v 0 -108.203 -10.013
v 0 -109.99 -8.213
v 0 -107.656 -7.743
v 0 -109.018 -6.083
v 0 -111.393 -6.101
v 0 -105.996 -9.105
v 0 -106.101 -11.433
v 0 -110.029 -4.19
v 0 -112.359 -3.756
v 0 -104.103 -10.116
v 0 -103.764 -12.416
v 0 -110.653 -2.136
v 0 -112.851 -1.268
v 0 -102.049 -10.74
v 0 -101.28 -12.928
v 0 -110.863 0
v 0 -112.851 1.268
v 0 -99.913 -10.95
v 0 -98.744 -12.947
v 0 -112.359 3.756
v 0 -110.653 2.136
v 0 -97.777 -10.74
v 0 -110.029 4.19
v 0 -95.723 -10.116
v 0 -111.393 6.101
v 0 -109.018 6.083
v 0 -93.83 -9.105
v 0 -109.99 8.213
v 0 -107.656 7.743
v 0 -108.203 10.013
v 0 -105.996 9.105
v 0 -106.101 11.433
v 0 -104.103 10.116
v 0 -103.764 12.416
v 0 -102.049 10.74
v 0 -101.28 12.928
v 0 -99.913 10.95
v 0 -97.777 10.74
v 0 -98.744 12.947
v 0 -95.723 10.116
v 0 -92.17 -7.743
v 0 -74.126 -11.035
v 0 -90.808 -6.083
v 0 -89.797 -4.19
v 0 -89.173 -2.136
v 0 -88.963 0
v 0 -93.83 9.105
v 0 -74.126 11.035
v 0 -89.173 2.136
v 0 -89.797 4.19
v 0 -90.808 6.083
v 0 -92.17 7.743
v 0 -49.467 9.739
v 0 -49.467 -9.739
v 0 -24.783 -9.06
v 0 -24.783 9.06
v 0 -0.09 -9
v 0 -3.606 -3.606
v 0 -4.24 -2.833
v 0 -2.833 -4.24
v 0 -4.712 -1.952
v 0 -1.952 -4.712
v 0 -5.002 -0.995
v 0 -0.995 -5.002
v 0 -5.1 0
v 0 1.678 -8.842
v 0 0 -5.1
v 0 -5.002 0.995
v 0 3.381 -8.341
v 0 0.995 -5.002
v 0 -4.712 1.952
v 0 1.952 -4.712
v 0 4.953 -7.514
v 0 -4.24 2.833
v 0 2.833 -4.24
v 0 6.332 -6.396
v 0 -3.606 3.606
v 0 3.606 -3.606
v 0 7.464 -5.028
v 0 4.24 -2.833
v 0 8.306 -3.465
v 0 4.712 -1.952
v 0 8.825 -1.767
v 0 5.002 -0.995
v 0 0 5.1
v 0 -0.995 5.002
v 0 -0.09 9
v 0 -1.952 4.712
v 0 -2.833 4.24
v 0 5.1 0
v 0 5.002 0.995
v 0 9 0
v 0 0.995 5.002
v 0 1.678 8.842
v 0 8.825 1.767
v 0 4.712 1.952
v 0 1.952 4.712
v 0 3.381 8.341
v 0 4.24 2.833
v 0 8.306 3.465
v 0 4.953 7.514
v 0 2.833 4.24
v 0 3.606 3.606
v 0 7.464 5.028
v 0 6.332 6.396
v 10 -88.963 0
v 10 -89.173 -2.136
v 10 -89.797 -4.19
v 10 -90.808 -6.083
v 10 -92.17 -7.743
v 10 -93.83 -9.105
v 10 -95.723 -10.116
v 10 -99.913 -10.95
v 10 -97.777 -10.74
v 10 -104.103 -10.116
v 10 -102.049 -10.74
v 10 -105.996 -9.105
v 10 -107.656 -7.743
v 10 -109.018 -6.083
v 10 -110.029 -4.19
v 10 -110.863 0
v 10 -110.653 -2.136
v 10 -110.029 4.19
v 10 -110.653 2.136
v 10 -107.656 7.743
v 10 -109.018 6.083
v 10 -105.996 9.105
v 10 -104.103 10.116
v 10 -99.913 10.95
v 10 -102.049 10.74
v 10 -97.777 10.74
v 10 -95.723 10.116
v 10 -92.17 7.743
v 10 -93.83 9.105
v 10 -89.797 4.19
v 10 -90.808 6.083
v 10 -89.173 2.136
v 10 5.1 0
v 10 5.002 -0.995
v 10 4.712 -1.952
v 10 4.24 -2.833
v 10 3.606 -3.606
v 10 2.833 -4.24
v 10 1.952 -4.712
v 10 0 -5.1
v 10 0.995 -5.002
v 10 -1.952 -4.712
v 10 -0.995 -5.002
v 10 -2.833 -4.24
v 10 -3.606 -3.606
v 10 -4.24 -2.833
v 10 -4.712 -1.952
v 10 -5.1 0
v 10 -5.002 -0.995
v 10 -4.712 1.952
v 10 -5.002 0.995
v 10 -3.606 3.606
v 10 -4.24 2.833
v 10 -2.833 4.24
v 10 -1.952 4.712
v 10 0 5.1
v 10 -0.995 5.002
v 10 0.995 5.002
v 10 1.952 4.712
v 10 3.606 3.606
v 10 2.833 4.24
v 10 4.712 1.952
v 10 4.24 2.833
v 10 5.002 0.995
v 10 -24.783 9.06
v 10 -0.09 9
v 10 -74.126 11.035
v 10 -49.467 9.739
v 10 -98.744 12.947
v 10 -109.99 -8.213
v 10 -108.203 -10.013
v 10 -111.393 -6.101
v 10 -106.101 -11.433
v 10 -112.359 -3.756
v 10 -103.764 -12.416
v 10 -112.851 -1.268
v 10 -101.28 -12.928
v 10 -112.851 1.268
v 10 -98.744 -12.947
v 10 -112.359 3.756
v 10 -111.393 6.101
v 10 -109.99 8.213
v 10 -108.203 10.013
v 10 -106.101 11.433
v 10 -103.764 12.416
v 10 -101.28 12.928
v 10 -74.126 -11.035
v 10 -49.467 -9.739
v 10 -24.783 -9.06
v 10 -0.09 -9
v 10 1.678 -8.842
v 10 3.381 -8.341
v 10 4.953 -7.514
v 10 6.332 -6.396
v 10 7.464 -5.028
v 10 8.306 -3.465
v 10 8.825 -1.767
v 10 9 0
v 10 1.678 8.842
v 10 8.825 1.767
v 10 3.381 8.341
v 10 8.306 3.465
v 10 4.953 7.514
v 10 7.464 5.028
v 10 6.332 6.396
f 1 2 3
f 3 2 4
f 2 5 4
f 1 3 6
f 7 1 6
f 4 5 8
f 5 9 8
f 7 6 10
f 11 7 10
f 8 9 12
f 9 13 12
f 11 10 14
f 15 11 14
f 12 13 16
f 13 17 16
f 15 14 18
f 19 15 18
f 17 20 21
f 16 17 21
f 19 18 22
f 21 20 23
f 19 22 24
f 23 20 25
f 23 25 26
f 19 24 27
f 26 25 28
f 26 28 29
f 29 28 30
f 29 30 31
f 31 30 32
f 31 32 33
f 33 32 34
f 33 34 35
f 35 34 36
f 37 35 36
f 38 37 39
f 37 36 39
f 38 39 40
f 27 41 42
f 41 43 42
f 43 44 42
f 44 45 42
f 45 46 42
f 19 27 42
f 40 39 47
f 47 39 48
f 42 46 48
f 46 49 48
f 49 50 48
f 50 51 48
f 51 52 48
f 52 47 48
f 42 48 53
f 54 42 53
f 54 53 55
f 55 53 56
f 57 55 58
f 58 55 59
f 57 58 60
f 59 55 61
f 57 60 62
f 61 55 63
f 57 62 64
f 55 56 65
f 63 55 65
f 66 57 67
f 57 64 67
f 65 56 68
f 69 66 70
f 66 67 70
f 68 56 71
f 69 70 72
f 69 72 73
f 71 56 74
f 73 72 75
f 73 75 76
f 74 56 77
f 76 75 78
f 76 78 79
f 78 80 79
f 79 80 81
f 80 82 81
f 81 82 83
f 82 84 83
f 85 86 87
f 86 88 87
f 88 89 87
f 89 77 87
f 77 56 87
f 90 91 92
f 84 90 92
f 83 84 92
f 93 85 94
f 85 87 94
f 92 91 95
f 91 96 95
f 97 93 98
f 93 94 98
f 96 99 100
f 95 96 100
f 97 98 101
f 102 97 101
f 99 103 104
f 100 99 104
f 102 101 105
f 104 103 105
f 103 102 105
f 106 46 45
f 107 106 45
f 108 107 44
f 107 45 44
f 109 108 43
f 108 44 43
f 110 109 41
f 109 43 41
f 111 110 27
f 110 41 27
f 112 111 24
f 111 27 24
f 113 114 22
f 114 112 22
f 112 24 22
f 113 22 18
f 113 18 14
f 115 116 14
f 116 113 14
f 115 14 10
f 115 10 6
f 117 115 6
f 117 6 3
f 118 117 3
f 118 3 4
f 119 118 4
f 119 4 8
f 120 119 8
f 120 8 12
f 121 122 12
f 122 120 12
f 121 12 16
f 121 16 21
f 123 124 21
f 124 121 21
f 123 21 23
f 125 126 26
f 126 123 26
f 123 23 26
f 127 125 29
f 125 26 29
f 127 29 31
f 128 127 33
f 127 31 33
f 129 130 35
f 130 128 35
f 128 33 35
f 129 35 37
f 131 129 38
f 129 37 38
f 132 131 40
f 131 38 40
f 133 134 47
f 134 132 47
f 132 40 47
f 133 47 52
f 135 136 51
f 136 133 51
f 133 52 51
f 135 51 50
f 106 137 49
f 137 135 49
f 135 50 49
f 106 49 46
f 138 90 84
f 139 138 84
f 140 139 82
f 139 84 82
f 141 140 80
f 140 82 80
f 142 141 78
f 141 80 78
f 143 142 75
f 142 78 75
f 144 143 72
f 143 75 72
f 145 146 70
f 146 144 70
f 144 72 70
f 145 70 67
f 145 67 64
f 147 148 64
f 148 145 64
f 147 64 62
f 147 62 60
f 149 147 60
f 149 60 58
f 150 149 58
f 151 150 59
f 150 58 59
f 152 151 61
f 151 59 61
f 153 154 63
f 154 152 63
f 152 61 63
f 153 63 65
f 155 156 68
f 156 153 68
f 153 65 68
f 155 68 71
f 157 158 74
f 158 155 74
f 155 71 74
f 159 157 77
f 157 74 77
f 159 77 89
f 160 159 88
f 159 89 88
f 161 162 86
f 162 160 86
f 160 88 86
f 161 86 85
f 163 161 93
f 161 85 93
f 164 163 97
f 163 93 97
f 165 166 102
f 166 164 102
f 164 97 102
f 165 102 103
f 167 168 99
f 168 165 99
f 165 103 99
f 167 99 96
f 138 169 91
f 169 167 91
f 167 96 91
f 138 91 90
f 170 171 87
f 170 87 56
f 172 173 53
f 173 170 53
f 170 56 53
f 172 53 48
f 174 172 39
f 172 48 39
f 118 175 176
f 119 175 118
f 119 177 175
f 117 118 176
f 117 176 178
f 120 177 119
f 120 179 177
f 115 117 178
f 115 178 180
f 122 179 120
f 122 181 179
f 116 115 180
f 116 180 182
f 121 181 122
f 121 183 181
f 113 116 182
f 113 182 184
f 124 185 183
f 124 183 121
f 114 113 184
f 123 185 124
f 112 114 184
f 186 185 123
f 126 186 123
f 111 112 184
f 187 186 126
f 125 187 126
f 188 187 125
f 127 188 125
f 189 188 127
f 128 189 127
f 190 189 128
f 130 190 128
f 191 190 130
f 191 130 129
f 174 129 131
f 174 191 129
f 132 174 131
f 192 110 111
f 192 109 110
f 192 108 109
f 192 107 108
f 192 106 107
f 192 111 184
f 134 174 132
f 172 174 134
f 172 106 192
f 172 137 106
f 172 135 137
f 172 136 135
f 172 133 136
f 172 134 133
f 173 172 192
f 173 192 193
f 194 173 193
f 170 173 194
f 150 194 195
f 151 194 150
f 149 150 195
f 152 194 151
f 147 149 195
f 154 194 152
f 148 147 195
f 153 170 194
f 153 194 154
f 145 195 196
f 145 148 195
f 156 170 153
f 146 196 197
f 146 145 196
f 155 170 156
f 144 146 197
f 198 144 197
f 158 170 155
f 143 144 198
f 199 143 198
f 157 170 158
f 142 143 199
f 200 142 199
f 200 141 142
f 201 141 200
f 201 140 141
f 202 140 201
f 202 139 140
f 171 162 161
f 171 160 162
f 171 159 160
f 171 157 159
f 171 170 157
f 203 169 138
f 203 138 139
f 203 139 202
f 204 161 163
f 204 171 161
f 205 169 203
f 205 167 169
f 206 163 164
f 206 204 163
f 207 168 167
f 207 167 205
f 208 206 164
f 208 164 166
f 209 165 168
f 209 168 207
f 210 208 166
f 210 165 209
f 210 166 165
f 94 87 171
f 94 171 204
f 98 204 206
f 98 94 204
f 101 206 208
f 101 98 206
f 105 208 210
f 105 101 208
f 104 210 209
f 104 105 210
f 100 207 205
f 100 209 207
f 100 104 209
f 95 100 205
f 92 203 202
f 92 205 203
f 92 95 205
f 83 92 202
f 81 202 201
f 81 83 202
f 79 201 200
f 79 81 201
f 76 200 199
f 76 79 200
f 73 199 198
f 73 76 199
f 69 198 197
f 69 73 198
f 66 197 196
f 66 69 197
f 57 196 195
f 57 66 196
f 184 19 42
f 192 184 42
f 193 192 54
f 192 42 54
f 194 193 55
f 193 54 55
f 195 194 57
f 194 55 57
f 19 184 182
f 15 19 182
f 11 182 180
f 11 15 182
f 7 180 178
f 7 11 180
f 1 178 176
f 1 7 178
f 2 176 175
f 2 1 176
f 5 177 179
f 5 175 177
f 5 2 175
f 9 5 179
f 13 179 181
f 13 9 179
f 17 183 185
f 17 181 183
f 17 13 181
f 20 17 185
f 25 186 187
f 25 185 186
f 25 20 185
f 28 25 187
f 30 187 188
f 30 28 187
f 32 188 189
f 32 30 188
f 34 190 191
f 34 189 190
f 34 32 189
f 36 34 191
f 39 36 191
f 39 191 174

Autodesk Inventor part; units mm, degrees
ref_plane "YZ Plane" through (0, 0, 0) normal (1, 0, 0) x (0, 1, 0)
ref_plane "XZ Plane" through (0, 0, 0) normal (0, 1, 0) x (-1, 0, 0)
sketch "Skizze1" plane through (0, 0, 0) normal (1, 0, 0) x (0, 1, 0)
  circle A0 centre (-99.913, 0) radius 13
  circle A1 centre (-99.913, 0) radius 10.95
  circle A2 centre (0, 0) radius 9
  arc A3 (-98.7442, 12.9473) -> (-0.0904, 8.9995) centre (-10, 995.9932) ccw
  arc A4 (-0.0904, -8.9995) -> (-98.7442, -12.9473) centre (-10, -995.9932) ccw
  circle A5 centre (0, 0) radius 5.1
  dimension "d0" = 26
  dimension "d1" = 99.913
  dimension "d2" = 21.9
  dimension "d3" = 18
  dimension "d6" = 0
  dimension "d7" = 0
  dimension "d8" = 0
  dimension "d9" = 10
  dimension "d10" = 10
  dimension "d11" = 10.2
extrude "Extrusion1" add sketch "Skizze1" along normal blind 10
ref_plane "Arbeitsebene1" through (0, 0, 0) normal (0, 0, 1) x (1, 0, 0)
properties part number "Hebel"
